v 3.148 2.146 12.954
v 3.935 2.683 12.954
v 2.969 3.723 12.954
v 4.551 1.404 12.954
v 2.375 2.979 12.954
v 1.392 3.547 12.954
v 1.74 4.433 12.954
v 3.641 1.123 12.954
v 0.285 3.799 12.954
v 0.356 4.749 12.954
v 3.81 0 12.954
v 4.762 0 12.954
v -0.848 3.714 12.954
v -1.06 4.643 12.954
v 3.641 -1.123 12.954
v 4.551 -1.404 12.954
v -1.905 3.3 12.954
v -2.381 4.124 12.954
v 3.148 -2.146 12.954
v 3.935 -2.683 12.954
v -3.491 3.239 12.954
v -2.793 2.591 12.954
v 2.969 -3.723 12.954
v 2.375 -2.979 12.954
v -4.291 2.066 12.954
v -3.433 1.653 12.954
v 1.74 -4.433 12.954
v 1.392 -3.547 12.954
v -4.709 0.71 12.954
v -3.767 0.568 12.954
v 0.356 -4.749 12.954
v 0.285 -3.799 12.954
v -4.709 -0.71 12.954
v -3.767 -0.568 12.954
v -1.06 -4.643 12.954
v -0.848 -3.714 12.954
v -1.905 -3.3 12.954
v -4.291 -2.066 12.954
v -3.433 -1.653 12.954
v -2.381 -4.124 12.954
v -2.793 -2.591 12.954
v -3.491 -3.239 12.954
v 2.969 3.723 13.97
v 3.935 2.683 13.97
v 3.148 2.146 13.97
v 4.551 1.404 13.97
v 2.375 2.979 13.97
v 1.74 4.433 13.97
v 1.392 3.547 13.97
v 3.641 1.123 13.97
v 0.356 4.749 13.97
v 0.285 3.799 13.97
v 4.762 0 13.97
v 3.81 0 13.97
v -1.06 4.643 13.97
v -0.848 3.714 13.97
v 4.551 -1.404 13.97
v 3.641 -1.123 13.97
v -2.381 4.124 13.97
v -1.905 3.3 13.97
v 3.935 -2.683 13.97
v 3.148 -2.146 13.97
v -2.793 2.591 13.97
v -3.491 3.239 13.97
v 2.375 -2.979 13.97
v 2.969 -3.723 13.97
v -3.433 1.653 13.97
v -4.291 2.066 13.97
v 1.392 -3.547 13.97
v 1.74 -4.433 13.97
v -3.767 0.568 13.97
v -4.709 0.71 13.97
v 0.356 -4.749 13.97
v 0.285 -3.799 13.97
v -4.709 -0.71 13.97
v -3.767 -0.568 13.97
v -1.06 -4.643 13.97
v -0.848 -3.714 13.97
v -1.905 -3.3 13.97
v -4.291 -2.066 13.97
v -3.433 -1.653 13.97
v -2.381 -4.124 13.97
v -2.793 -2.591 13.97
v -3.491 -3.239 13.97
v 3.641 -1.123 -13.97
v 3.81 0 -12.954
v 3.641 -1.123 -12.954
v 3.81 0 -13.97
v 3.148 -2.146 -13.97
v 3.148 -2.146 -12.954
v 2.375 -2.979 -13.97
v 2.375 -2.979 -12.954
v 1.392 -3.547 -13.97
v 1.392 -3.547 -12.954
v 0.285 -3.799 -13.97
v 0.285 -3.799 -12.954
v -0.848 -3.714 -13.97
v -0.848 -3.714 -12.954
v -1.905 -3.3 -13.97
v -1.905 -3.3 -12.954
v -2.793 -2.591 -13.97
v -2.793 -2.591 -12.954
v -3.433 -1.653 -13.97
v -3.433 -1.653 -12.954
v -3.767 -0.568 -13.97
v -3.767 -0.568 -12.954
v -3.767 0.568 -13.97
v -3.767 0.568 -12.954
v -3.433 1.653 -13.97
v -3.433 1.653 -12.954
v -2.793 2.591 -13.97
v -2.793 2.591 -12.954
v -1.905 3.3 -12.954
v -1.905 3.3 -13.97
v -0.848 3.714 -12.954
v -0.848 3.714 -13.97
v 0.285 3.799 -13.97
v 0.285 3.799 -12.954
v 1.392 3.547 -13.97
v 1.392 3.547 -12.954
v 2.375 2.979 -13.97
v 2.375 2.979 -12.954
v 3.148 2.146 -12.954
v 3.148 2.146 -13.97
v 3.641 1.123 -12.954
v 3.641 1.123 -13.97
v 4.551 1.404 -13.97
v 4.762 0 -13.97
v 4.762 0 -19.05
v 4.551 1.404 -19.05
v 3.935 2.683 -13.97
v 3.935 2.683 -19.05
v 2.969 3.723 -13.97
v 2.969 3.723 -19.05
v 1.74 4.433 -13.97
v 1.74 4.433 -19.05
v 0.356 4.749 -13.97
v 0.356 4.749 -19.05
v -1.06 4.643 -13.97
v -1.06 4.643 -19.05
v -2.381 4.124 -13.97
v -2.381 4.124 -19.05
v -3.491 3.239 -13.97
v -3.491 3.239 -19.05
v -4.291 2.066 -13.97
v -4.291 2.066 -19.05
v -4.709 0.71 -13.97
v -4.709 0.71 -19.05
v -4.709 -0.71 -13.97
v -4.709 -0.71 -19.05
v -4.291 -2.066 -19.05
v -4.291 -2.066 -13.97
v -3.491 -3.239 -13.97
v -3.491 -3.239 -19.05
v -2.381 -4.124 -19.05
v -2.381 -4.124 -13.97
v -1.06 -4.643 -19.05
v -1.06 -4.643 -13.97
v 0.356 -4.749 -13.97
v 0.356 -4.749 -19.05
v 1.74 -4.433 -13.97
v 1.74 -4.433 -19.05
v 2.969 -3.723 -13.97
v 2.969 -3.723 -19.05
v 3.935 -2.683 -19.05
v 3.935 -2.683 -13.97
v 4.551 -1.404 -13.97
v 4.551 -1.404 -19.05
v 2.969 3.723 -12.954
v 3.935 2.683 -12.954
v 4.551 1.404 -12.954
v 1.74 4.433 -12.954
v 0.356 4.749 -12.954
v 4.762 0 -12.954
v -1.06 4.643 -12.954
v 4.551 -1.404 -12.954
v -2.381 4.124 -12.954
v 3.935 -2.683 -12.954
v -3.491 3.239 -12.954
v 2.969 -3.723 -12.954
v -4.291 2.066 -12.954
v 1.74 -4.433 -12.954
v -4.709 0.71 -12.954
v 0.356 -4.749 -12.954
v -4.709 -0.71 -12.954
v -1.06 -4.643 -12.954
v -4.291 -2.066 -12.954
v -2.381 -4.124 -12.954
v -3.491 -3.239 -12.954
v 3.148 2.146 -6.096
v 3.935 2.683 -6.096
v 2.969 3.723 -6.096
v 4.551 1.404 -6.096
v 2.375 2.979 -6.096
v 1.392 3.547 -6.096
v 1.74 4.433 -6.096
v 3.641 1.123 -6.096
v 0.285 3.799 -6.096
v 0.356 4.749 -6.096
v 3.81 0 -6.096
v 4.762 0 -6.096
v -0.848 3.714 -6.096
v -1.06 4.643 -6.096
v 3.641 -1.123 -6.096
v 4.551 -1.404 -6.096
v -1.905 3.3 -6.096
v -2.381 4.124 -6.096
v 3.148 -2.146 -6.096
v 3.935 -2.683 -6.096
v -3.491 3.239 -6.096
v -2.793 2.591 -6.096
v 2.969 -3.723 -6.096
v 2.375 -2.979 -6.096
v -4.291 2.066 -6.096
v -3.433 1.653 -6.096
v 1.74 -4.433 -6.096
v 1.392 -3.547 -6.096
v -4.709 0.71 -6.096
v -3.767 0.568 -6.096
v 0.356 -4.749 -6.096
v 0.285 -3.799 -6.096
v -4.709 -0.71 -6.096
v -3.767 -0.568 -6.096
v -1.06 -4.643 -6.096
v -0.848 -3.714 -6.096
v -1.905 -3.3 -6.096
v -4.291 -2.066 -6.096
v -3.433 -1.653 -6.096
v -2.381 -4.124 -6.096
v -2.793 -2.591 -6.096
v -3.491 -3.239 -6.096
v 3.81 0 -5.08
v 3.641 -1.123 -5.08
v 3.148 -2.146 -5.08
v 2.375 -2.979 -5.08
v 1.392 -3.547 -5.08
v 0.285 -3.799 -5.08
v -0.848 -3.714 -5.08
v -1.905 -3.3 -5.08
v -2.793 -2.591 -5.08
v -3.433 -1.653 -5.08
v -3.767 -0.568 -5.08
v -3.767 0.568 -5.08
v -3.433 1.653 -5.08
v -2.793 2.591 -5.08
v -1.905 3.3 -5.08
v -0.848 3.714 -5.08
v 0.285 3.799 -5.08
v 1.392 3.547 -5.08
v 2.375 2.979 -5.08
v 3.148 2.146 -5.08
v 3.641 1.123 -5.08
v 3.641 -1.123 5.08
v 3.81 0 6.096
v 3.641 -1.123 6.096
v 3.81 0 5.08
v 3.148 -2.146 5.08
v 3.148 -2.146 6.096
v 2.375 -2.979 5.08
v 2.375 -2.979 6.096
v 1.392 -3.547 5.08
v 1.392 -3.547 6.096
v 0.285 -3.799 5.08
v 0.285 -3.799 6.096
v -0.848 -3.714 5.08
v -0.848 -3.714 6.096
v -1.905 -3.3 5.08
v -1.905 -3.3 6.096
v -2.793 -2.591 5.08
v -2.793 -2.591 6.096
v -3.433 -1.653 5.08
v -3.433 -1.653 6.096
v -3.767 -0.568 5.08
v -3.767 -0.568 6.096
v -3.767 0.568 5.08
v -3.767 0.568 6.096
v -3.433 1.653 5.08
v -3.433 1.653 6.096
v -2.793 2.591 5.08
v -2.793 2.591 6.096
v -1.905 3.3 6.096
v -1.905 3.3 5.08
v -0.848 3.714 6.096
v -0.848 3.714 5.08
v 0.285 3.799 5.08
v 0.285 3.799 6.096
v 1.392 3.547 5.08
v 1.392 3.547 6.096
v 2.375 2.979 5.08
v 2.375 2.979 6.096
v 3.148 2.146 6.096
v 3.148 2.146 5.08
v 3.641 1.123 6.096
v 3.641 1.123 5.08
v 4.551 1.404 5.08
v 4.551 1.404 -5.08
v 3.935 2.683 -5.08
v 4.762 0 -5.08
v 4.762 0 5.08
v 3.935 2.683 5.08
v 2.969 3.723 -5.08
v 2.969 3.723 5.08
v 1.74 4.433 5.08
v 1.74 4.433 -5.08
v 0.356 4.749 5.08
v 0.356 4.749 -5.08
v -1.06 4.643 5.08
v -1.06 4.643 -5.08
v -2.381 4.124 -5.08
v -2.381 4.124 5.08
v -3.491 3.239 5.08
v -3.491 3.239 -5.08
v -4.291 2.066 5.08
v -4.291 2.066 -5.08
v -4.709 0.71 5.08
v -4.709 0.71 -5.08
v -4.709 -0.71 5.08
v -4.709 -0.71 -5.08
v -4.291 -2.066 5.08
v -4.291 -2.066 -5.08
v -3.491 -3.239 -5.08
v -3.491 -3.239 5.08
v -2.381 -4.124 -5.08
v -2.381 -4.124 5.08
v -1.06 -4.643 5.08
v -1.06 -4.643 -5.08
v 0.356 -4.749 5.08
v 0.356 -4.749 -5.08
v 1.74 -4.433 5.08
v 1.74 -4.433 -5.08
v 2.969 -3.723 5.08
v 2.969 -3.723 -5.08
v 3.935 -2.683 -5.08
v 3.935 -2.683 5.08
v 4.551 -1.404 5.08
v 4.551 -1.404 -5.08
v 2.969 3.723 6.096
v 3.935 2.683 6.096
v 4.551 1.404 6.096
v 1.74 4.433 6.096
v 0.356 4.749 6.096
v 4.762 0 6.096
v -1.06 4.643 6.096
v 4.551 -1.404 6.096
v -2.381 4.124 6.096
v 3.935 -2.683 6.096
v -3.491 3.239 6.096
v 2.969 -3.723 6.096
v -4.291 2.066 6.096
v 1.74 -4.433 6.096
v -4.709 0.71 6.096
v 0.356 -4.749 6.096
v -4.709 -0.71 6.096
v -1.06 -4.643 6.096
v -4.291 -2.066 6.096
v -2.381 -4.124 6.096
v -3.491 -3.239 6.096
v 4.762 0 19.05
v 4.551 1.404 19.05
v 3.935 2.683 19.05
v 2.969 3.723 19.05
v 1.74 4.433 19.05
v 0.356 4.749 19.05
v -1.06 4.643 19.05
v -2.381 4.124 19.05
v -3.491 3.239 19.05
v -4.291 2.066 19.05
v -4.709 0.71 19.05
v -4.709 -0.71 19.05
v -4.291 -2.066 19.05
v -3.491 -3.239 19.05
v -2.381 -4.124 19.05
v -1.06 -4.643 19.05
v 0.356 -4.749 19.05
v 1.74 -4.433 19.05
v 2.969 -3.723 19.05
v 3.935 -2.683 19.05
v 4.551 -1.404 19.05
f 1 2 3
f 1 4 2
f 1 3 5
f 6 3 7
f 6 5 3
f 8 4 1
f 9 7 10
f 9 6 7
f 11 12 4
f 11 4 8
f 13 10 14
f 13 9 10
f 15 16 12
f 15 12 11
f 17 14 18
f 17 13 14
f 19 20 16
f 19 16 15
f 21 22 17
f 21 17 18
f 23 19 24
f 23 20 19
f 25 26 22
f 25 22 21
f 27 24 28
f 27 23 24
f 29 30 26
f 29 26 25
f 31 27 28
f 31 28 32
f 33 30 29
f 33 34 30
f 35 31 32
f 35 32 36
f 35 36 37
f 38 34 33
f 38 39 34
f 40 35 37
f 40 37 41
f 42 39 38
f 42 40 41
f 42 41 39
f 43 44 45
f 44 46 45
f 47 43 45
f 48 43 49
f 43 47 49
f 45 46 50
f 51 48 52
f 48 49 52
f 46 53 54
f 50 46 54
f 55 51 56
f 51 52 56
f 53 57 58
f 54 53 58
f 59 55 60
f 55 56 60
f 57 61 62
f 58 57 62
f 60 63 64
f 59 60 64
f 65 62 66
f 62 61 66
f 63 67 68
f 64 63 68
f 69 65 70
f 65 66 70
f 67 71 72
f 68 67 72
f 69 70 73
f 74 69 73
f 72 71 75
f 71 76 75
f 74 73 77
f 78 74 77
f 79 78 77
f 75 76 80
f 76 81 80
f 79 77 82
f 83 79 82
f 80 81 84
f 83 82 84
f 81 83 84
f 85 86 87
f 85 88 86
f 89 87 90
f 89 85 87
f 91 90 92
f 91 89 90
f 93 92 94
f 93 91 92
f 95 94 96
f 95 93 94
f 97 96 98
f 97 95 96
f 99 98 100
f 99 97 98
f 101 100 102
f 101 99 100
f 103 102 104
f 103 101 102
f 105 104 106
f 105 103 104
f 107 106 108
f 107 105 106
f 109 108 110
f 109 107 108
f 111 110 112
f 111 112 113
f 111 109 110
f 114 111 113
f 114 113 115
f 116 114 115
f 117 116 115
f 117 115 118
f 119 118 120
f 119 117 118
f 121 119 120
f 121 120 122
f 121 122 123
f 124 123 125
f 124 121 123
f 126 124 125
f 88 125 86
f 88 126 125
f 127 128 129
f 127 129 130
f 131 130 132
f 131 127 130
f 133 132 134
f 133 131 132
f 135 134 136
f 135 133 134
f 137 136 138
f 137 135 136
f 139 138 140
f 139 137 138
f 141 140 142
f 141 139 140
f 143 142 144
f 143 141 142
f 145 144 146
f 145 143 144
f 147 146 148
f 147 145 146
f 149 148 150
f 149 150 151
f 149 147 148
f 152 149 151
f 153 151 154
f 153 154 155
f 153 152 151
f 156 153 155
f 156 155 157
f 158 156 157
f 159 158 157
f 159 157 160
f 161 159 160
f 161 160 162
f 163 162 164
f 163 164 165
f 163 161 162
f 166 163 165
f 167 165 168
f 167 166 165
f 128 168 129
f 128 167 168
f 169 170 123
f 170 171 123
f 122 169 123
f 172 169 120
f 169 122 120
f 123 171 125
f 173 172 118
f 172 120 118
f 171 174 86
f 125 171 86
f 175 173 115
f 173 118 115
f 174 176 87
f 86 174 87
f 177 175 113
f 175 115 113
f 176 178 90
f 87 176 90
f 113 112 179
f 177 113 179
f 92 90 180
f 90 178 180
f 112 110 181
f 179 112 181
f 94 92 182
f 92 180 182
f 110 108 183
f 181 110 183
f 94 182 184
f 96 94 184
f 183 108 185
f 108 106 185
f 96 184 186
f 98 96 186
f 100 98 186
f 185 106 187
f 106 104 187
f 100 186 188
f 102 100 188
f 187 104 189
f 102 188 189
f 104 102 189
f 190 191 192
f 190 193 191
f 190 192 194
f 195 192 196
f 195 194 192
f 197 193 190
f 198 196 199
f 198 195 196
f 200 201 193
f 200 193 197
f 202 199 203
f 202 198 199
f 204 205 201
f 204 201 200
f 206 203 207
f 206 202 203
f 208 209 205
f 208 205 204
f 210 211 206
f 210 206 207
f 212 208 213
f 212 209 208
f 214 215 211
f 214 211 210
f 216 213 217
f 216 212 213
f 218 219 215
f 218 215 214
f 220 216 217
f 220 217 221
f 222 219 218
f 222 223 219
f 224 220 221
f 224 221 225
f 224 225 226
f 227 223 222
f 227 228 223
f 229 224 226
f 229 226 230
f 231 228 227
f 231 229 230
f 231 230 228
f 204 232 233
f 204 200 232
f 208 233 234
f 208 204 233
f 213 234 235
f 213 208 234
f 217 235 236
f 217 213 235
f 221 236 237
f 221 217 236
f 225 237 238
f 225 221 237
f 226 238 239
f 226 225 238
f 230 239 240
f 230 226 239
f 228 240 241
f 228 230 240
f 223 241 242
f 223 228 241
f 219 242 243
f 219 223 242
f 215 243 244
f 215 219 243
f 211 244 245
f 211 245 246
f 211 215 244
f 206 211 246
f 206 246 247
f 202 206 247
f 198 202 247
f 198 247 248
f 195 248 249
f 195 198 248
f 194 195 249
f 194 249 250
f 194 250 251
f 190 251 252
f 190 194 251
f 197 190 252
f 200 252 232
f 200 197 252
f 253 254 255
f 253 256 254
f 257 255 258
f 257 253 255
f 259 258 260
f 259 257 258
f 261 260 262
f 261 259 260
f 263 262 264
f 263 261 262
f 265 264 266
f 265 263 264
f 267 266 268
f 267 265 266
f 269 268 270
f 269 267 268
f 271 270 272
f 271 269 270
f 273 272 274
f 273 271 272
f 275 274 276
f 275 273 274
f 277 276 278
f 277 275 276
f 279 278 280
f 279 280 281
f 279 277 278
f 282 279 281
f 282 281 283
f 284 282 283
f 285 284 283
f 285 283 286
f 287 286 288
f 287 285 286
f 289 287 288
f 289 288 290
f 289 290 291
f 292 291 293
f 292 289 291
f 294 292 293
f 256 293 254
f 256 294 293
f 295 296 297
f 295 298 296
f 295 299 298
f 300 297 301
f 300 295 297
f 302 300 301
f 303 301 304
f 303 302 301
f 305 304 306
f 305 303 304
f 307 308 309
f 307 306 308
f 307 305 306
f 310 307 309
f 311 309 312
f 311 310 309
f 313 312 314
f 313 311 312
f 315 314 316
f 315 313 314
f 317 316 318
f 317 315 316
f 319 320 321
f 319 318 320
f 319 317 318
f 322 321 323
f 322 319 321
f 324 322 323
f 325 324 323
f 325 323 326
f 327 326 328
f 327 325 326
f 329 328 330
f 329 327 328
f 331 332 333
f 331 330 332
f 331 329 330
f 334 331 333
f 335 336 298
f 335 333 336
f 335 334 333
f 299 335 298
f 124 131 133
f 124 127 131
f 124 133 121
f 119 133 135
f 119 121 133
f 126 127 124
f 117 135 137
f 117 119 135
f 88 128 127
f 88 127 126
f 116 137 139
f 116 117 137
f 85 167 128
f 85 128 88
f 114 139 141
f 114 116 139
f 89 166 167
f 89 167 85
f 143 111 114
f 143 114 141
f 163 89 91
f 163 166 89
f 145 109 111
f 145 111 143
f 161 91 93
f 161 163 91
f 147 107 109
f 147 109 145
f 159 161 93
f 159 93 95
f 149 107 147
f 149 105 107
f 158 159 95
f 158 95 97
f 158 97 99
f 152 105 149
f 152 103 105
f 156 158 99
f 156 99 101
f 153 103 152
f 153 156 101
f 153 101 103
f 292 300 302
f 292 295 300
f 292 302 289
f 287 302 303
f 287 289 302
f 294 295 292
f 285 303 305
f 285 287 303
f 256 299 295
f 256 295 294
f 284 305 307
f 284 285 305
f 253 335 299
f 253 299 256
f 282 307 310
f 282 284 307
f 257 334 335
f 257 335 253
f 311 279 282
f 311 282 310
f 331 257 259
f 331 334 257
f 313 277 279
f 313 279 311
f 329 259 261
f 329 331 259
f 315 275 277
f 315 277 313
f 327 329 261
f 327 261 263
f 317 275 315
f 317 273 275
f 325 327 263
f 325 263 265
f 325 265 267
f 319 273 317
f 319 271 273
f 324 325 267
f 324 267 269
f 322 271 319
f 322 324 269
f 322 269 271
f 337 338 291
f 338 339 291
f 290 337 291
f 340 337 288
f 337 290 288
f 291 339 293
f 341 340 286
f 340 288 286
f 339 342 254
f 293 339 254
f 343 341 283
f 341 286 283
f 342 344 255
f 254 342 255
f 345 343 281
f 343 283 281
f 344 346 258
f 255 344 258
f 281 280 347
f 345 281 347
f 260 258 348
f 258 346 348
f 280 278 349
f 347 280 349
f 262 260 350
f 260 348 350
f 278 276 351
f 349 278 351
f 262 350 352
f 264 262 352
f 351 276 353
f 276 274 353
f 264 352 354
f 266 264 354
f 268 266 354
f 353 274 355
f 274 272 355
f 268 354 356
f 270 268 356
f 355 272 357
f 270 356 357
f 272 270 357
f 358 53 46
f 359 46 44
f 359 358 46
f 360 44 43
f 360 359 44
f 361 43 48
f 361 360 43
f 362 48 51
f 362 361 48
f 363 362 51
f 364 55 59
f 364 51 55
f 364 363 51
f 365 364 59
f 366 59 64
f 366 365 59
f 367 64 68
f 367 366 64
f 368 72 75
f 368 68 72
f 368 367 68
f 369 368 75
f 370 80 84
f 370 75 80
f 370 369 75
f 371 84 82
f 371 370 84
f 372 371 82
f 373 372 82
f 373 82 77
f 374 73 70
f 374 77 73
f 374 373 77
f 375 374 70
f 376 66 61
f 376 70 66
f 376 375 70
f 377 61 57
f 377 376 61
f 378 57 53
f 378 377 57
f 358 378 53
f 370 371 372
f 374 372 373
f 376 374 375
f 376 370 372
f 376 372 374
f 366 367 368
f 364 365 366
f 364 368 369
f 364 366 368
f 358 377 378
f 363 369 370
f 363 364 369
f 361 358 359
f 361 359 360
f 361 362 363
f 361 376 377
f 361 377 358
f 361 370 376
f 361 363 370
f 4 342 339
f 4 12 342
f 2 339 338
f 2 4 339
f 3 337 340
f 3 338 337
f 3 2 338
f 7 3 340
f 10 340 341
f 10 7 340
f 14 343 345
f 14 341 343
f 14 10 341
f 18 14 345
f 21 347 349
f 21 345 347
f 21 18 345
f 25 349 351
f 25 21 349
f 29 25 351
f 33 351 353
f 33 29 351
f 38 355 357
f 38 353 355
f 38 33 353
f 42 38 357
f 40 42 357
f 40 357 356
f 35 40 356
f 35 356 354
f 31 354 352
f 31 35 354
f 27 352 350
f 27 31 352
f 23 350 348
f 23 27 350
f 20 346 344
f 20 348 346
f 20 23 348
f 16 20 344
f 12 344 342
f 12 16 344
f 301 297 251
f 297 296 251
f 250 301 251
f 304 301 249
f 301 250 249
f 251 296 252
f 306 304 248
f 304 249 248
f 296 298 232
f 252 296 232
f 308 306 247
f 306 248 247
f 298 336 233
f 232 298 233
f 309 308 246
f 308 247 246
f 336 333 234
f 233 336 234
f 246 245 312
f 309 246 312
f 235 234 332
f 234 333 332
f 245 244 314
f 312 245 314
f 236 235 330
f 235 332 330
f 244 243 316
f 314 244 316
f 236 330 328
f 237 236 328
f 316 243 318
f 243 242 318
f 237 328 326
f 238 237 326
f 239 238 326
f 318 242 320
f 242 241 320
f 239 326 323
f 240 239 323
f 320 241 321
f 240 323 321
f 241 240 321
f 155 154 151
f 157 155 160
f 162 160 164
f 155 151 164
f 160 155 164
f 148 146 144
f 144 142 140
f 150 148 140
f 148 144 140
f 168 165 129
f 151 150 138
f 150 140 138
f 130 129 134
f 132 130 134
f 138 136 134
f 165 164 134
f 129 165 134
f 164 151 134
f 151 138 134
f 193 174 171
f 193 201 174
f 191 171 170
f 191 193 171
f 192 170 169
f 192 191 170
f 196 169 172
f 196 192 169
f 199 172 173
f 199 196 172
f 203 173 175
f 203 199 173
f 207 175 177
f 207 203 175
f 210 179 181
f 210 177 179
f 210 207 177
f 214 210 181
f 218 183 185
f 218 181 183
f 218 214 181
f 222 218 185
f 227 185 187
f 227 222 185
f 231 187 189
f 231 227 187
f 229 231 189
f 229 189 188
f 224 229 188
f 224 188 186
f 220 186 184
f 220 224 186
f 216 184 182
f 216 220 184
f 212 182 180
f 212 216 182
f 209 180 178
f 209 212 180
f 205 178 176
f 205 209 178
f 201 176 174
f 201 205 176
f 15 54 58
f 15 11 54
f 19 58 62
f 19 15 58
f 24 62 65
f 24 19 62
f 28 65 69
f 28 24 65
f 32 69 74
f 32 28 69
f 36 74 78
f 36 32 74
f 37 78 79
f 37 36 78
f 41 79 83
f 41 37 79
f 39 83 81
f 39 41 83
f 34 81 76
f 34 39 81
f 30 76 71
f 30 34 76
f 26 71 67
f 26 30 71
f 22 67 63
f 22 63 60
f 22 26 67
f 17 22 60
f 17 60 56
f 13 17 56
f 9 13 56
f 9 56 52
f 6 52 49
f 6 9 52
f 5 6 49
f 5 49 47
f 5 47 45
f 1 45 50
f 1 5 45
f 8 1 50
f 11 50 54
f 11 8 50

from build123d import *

# Parameters (mm, degrees)
SKETCH1_R           = 4.7625
BOSS_EXTRUDE1_DEPTH = 19.05
SKETCH2_W           = 0.9525
SKETCH2_H           = 1.016


with BuildPart() as part:
    # Sketch1 → Boss-Extrude1 (new body, symmetric)
    with BuildSketch(Plane.XY):
        Circle(SKETCH1_R)
    extrude(amount=BOSS_EXTRUDE1_DEPTH, both=True)

    # Sketch2 → Cut-Revolve1 (revolve, cut)
    with BuildSketch(Plane(origin=(0, 0, 0), x_dir=(1, 0, 0), z_dir=(0, 1, 0))):
        with Locations((4.28625, 13.462)):
            Rectangle(SKETCH2_W, SKETCH2_H)
        with Locations((4.28625, -13.462)):
            Rectangle(SKETCH2_W, SKETCH2_H)
        with Locations((4.28625, 5.588)):
            Rectangle(SKETCH2_W, SKETCH2_H)
        with Locations((4.28625, -5.588)):
            Rectangle(SKETCH2_W, SKETCH2_H)
    revolve(axis=Axis((0, 0, 19.05), (0, 0, -1)), mode=Mode.SUBTRACT)


solid = part.part
